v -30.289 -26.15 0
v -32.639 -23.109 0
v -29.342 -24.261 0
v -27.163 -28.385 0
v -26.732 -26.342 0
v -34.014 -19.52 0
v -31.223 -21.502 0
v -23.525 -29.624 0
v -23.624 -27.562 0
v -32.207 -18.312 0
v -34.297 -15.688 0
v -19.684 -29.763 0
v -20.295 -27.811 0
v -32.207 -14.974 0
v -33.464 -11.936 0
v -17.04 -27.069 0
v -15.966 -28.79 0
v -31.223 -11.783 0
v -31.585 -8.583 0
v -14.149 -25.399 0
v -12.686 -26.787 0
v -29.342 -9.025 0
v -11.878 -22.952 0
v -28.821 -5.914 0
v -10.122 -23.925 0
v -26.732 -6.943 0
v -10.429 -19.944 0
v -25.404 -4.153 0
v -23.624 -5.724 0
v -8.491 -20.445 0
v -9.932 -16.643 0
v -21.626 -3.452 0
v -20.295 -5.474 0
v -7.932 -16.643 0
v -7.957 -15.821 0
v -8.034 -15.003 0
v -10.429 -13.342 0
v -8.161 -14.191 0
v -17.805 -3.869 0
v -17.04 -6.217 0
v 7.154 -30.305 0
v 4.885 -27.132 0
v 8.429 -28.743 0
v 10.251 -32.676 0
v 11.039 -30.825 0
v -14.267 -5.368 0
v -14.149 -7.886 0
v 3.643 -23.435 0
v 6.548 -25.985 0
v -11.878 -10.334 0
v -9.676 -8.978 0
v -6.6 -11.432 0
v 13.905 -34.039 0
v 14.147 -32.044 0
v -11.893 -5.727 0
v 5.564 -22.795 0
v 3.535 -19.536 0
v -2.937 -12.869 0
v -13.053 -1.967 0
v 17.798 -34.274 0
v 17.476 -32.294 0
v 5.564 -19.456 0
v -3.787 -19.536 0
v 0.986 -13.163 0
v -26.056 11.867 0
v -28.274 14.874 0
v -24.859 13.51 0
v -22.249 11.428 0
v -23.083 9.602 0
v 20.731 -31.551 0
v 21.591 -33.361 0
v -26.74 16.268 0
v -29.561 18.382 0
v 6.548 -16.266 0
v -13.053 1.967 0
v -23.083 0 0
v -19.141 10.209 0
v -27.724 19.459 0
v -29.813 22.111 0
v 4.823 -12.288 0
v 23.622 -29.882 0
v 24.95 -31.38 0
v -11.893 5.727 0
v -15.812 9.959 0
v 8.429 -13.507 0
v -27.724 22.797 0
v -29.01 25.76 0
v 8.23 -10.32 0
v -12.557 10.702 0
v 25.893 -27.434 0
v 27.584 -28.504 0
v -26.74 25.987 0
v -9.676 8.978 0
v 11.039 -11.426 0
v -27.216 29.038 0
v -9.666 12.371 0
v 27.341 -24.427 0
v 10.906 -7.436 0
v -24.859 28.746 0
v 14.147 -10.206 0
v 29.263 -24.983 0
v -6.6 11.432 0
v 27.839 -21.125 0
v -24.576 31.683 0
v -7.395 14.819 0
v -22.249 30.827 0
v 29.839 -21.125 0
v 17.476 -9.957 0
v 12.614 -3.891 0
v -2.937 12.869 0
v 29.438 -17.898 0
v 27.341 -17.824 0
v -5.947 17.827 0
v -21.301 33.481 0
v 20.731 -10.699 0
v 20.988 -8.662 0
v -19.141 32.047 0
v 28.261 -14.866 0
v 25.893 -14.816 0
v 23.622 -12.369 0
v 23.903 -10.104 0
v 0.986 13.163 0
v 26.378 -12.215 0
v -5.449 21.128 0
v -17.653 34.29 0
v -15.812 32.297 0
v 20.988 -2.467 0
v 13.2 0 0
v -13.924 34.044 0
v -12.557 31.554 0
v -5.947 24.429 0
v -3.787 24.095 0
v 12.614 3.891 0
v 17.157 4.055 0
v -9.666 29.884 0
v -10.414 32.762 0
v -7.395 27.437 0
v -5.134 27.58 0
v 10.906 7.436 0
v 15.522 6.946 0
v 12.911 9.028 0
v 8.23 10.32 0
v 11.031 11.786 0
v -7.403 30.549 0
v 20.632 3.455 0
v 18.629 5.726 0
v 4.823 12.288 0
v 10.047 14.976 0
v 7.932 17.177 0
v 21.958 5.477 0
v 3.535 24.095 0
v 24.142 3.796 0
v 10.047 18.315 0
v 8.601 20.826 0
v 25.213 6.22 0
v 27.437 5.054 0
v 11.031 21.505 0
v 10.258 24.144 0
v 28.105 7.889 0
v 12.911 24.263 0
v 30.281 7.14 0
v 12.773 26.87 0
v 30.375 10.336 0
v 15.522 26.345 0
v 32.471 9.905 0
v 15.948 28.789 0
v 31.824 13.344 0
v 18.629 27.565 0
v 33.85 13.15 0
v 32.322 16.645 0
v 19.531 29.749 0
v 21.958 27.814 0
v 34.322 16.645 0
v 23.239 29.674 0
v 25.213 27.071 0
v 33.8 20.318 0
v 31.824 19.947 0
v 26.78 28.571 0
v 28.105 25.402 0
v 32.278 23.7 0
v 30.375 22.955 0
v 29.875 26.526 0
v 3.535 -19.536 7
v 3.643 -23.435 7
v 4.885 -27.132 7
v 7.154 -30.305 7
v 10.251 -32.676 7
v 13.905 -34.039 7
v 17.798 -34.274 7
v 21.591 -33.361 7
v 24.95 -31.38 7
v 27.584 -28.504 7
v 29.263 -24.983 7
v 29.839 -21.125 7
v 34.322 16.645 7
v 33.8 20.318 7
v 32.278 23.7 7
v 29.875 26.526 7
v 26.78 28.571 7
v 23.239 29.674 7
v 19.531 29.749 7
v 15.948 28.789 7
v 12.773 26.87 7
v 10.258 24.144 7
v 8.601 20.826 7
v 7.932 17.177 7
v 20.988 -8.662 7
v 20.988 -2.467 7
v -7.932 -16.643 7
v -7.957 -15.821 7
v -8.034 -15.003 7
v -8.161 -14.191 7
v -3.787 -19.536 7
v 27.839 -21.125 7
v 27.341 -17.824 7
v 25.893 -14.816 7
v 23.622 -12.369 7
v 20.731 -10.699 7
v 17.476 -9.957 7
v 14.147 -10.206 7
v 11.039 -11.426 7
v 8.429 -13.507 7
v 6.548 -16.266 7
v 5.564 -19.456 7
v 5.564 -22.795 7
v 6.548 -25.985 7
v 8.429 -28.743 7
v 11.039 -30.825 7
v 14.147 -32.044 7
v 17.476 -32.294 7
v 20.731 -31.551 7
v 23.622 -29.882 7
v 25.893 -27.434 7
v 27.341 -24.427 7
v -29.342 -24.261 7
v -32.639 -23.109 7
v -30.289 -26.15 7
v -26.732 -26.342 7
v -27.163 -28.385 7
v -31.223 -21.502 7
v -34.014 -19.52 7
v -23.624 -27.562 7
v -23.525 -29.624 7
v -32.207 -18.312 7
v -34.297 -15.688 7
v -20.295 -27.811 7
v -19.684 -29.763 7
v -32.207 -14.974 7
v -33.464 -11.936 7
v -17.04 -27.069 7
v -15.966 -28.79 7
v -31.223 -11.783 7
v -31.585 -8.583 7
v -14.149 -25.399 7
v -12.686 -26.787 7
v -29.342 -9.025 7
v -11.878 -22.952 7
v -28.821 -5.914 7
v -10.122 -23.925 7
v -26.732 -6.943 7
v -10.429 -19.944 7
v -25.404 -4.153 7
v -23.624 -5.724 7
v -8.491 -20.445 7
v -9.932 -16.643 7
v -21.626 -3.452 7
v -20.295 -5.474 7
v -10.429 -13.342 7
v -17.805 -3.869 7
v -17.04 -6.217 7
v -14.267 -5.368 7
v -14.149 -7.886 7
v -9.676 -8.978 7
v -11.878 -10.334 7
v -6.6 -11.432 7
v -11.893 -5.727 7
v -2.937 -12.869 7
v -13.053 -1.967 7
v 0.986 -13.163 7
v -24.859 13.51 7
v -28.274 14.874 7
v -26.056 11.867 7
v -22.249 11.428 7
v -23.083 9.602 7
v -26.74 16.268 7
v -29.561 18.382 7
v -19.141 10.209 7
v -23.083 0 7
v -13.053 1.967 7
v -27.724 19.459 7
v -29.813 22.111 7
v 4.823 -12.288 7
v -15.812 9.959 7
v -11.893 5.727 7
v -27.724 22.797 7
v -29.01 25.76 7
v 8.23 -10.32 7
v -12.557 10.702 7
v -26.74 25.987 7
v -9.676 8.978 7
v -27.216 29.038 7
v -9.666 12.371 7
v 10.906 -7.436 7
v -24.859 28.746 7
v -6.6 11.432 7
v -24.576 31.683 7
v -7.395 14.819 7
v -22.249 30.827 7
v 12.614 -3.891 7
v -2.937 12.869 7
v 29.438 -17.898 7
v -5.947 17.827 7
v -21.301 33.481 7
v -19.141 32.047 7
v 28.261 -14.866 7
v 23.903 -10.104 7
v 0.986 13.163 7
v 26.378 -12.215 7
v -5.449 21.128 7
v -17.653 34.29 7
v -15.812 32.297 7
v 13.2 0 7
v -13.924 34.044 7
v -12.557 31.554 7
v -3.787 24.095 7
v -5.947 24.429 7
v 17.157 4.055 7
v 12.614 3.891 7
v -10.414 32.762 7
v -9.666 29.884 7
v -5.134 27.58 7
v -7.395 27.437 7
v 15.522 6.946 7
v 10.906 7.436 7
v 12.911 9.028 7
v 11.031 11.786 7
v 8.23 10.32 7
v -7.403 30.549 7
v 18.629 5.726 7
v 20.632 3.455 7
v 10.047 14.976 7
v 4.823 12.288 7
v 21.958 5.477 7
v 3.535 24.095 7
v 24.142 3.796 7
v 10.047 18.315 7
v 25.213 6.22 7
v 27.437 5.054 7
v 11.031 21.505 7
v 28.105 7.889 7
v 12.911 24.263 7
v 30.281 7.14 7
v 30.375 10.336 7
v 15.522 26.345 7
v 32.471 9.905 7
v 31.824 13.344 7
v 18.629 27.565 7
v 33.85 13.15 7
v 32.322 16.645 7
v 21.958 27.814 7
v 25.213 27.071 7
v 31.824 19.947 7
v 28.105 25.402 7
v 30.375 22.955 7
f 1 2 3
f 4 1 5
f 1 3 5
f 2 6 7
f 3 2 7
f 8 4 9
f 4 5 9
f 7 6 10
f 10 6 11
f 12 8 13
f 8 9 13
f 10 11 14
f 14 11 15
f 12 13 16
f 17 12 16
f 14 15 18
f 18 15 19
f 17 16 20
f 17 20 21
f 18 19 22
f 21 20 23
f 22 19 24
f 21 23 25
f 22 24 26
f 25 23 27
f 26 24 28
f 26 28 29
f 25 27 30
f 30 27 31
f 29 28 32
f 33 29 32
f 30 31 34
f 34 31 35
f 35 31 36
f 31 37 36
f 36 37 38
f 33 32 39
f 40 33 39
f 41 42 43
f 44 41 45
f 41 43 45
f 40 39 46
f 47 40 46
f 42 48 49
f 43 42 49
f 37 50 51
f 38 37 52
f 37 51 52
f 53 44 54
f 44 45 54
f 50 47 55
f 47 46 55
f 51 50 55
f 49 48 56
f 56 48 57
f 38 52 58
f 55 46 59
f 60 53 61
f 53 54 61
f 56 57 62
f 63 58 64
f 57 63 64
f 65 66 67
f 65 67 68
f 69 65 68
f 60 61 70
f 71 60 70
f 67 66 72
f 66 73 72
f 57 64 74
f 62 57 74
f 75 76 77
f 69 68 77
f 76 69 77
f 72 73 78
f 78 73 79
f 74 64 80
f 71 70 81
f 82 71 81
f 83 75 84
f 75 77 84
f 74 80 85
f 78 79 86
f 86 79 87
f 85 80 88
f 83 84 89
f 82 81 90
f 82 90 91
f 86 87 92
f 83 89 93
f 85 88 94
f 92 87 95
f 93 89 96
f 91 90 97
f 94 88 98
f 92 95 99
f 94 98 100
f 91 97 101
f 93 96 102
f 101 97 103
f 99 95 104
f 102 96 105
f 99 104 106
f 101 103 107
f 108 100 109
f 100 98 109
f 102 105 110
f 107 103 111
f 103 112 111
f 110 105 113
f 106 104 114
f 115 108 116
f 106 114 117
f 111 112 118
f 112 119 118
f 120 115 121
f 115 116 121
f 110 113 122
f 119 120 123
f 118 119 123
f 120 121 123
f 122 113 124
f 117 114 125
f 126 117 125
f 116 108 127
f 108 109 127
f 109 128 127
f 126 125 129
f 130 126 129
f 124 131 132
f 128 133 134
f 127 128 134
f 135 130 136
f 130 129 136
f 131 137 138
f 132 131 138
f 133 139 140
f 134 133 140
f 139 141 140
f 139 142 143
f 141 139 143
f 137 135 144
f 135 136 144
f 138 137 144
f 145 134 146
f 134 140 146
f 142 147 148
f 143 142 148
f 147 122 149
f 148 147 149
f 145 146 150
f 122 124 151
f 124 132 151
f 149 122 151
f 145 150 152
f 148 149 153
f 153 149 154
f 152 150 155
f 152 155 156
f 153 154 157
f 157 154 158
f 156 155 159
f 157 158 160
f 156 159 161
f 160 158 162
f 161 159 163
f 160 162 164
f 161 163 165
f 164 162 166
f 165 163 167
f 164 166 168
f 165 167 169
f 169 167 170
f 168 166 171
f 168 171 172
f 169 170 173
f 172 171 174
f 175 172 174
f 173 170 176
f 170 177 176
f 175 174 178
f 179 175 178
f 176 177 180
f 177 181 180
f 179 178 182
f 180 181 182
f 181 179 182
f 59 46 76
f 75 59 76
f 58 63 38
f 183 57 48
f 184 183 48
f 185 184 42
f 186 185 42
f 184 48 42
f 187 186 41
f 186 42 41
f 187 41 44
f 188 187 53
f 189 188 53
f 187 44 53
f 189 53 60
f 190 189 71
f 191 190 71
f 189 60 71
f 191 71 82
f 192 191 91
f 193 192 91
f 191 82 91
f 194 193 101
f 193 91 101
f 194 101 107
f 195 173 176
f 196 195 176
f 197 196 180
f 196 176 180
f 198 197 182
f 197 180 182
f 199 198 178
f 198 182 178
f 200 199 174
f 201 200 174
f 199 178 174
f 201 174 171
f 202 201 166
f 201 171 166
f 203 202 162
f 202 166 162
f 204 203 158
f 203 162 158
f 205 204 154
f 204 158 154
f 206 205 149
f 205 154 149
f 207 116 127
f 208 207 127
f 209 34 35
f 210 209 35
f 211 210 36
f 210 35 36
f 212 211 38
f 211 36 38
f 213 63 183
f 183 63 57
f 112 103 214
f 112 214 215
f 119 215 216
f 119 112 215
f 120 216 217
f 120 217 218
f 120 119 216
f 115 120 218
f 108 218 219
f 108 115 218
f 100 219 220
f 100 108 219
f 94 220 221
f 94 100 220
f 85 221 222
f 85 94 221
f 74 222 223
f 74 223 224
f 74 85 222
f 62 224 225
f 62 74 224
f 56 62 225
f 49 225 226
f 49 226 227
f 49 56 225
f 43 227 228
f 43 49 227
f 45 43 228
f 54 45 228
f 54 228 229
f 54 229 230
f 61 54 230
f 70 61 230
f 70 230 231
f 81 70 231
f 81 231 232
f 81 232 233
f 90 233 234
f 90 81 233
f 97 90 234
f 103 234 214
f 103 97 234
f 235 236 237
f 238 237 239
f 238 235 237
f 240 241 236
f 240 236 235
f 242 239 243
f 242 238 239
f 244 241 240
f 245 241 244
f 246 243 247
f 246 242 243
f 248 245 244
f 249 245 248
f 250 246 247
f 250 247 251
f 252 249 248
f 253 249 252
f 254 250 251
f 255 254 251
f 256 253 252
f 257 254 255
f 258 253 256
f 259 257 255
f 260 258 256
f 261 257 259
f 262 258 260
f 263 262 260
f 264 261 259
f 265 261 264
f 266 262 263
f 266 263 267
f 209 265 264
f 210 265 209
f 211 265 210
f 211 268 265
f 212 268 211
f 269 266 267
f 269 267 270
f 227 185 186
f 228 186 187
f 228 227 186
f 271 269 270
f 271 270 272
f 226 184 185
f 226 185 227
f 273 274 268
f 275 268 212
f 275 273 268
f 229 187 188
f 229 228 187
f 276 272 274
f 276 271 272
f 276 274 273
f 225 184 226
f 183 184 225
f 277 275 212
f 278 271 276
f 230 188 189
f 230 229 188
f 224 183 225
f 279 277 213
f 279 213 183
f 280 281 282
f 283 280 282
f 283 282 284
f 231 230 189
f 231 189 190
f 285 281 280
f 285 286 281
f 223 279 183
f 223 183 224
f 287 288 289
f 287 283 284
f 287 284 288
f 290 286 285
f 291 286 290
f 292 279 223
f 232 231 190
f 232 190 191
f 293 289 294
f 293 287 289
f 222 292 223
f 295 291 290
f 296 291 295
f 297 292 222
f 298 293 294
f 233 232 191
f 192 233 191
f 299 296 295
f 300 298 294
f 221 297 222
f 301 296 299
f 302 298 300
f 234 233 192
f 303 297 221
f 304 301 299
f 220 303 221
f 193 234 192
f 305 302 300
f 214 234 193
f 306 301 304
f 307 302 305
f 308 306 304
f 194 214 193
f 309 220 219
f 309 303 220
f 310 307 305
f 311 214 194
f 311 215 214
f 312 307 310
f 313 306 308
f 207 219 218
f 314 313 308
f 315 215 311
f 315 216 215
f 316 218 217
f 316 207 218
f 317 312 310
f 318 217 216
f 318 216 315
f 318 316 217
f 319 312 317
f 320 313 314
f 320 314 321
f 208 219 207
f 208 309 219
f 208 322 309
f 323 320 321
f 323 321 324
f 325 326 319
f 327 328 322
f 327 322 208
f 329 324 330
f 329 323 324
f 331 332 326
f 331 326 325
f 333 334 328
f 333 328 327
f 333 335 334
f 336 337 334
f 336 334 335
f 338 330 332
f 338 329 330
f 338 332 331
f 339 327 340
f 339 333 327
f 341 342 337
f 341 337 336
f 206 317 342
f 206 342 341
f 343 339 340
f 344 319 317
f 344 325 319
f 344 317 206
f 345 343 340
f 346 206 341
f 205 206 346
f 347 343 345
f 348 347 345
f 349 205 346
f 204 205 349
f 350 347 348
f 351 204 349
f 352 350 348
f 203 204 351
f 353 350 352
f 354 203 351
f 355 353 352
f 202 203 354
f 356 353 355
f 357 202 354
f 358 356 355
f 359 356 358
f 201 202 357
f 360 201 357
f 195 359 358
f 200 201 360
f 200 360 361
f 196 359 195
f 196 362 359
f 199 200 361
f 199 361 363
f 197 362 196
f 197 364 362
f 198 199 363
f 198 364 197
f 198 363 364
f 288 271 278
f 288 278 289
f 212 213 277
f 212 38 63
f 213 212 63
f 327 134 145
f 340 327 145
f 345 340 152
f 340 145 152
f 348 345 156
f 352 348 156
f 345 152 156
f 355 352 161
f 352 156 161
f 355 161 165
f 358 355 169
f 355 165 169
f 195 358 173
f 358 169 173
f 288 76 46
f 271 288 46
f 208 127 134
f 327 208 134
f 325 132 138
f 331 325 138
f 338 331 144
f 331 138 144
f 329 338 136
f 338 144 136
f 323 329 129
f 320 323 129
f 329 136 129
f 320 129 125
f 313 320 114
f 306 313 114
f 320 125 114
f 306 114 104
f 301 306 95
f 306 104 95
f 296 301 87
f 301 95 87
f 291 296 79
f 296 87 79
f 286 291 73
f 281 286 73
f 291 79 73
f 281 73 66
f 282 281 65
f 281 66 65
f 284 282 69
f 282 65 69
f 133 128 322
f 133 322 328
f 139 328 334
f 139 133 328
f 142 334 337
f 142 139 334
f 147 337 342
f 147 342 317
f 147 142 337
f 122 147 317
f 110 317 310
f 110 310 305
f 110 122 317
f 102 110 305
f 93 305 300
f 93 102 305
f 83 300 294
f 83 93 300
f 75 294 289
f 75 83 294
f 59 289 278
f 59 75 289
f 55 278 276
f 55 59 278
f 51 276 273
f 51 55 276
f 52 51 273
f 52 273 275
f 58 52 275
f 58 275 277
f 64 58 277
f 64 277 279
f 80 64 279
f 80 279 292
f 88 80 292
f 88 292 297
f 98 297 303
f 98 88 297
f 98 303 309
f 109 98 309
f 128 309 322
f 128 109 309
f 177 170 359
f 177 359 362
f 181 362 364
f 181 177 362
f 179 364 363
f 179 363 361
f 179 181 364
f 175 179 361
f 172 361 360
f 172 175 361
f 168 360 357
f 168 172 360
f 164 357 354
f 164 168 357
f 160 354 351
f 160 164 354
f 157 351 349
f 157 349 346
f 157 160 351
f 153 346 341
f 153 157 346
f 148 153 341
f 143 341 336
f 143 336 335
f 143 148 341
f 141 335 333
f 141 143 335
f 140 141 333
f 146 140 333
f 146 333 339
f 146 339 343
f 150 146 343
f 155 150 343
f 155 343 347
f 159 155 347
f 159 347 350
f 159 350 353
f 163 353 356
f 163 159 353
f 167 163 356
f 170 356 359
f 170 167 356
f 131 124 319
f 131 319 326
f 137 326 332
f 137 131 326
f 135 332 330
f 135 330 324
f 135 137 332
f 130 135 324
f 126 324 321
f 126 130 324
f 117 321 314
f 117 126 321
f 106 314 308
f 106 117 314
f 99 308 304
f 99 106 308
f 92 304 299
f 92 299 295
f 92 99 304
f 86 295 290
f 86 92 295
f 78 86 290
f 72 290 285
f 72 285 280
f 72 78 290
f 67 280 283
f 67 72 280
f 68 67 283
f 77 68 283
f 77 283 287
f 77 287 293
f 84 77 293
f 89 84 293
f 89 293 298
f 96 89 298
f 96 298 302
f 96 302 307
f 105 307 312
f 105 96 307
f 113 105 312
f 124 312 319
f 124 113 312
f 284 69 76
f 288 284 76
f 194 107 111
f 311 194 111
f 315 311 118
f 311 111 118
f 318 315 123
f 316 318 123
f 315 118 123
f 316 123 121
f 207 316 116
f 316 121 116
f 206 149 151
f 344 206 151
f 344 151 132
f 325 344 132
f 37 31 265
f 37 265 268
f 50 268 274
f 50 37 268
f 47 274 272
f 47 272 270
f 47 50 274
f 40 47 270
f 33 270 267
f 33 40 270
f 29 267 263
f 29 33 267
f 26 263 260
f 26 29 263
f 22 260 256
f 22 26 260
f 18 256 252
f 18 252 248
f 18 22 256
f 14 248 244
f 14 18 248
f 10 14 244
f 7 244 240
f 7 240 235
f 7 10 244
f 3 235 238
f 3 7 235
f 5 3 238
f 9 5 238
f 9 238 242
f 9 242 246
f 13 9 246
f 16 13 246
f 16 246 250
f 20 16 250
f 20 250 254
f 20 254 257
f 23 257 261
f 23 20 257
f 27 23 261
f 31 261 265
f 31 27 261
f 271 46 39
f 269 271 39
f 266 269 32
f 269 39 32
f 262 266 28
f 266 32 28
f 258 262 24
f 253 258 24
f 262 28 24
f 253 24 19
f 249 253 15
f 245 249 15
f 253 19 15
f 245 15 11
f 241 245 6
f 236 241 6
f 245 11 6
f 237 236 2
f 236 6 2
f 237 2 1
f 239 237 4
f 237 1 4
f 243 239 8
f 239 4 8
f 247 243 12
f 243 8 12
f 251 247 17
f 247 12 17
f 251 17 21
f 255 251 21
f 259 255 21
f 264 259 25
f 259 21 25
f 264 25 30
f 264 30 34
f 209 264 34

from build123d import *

# Parameters (mm, degrees)
F0_R     = 11.2
F0_R_2   = 13.2
F1_DEPTH = 7


with BuildPart() as f1:
    # F0 (on Top) → F1 (new body)
    with BuildSketch(Plane.XY):
        with BuildLine():
            ThreePointArc((17.156998, 4.054863), (28.928834, 6.001855), (34.321521, 16.645437))
            ThreePointArc((34.321521, 16.645437), (21.387474, 29.842758), (7.932237, 17.177236))
            ThreePointArc((7.932237, 17.177236), (10.322797, 9.054155), (17.156998, 4.054863))
        make_face()
        with Locations((21.121521, 16.645437)):
            Circle(F0_R, mode=Mode.SUBTRACT)
        with BuildLine():
            ThreePointArc((17.156998, 4.054863), (10.322797, 9.054155), (7.932237, 17.177236))
            Line((7.932237, 17.177236), (3.535035, 24.094587))
            Line((3.535035, 24.094587), (-3.786889, 24.094587))
            ThreePointArc((-3.786889, 24.094587), (-3.533888, 22.620829), (-3.449192, 21.127913))
            ThreePointArc((-3.449192, 21.127913), (-9.966852, 9.744314), (-23.083484, 9.602294))
            Line((-23.083484, 9.602294), (-23.083484, 0))
            Line((-23.083484, 0), (-14.266823, -5.368319))
            ThreePointArc((-14.266823, -5.368319), (-10.27716, -9.131498), (-8.161303, -14.191348))
            Line((-8.161303, -14.191348), (-3.786889, -19.53627))
            Line((-3.786889, -19.53627), (3.535035, -19.53627))
            ThreePointArc((3.535035, -19.53627), (9.658903, -9.921811), (20.988215, -8.662342))
            Line((20.988215, -8.662342), (20.988215, -2.467444))
            Line((20.988215, -2.467444), (17.156998, 4.054863))
        make_face()
        Circle(F0_R_2, mode=Mode.SUBTRACT)
        with BuildLine():
            ThreePointArc((-3.449192, 21.127913), (-3.533888, 22.620829), (-3.786889, 24.094587))
            ThreePointArc((-3.786889, 24.094587), (-24.576138, 31.6827), (-23.083484, 9.602294))
            ThreePointArc((-23.083484, 9.602294), (-9.966852, 9.744314), (-3.449192, 21.127913))
        make_face()
        with Locations((-16.649192, 21.127913)):
            Circle(F0_R, mode=Mode.SUBTRACT)
        with BuildLine():
            ThreePointArc((29.839044, -21.125276), (27.401225, -13.482274), (20.988215, -8.662342))
            ThreePointArc((20.988215, -8.662342), (9.658903, -9.921811), (3.535035, -19.53627))
            ThreePointArc((3.535035, -19.53627), (15.843093, -34.301256), (29.839044, -21.125276))
        make_face()
        with Locations((16.639044, -21.125276)):
            Circle(F0_R, mode=Mode.SUBTRACT)
        with BuildLine():
            ThreePointArc((-8.161303, -14.191348), (-10.27716, -9.131498), (-14.266823, -5.368319))
            ThreePointArc((-14.266823, -5.368319), (-32.639404, -23.109021), (-7.931668, -16.6428))
            ThreePointArc((-7.931668, -16.6428), (-7.989202, -15.411708), (-8.161303, -14.191348))
        make_face()
        with Locations((-21.131668, -16.6428)):
            Circle(F0_R, mode=Mode.SUBTRACT)
    extrude(amount=F1_DEPTH)


solid = f1.part
